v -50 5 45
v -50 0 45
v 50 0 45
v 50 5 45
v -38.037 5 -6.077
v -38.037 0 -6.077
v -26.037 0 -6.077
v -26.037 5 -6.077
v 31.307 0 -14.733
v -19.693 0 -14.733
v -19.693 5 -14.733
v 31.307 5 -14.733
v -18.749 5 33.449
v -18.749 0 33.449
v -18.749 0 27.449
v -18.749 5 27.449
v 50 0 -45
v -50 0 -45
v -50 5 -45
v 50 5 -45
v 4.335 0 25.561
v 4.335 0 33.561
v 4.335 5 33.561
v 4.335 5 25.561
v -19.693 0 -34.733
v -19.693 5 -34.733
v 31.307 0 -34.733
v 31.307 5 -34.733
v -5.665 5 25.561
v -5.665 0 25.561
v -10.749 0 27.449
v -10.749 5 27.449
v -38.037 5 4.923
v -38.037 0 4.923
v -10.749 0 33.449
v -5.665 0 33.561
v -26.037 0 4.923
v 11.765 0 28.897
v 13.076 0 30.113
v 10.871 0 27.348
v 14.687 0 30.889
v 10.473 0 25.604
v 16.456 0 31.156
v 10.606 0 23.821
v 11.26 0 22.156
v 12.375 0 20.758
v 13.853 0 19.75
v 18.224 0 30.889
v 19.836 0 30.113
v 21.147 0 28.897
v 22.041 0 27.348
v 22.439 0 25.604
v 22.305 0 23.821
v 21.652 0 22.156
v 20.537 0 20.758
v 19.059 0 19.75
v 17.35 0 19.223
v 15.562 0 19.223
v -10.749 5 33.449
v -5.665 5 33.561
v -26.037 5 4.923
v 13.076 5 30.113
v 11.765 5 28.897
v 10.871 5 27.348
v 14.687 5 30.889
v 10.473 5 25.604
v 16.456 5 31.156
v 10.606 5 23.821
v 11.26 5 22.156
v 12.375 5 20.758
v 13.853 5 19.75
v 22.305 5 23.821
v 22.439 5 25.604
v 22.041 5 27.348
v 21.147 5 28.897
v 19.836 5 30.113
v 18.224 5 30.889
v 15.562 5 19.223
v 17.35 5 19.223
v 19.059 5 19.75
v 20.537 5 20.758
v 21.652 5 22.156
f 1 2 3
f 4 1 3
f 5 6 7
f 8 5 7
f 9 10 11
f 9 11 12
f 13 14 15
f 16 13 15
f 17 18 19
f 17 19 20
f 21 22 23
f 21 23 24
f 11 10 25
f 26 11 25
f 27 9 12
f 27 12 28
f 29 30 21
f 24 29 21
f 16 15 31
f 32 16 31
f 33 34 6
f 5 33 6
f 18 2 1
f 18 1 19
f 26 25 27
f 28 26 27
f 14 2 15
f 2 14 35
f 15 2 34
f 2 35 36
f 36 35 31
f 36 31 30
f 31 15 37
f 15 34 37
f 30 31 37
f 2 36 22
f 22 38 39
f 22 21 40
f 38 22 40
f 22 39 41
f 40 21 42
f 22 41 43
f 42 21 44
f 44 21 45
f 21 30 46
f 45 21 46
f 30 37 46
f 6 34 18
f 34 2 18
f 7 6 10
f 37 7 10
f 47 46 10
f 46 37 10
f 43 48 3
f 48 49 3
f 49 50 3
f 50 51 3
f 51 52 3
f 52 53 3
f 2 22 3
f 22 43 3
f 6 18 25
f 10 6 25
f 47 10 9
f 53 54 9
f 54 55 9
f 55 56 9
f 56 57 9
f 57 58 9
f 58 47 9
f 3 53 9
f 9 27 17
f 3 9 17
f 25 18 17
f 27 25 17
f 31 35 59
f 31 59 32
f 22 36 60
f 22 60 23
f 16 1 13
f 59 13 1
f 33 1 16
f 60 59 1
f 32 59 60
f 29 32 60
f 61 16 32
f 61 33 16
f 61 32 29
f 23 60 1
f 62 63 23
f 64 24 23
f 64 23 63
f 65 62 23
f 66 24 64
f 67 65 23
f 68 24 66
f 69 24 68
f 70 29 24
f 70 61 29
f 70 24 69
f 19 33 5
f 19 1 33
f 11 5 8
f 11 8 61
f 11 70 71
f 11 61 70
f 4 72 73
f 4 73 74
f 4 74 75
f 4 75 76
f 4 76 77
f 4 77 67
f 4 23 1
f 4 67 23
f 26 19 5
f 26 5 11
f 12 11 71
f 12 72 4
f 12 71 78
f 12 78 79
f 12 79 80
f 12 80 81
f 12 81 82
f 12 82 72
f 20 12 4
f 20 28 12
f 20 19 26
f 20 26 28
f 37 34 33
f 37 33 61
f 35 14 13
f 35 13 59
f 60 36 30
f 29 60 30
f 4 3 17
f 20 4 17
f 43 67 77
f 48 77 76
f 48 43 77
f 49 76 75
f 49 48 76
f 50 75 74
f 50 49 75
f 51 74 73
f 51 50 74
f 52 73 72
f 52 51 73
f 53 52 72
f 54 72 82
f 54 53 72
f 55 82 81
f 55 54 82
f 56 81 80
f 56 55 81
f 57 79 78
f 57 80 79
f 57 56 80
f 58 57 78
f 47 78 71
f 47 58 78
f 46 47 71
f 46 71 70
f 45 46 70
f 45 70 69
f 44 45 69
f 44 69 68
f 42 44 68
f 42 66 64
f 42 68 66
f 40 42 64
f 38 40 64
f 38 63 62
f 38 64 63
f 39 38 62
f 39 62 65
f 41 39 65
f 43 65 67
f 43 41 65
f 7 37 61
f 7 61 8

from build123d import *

# Parameters (mm, degrees)
SKETCH1_W           = 100
SKETCH1_H           = 90
BOSS_EXTRUDE2_DEPTH = 5
SKETCH2_R           = 6
SKETCH2_W           = 12
SKETCH2_H           = 11
SKETCH2_W_2         = 51
SKETCH2_H_2         = 20
SKETCH2_W_3         = 10
SKETCH2_H_3         = 8
SKETCH2_W_4         = 8
SKETCH2_H_4         = 6
CUT_EXTRUDE2_DEPTH  = 68.453687816


with BuildPart() as part:
    # Sketch1 → Boss-Extrude2 (new body)
    with BuildSketch(Plane(origin=(0, 0, 0), x_dir=(1, 0, 0), z_dir=(0, 1, 0))):
        Rectangle(SKETCH1_W, SKETCH1_H)
    extrude(amount=BOSS_EXTRUDE2_DEPTH)

    # Sketch2 → Cut-Extrude2 (cut, through all)
    with BuildSketch(Plane(origin=(0, 0, 0), x_dir=(1, 0, 0), z_dir=(0, 1, 0))):
        with Locations(Location((16.455886506, -25.155924864, 0), (0, 0, 270))):
            Circle(SKETCH2_R)
        with Locations((-32.037377006, 0.57672248)):
            Rectangle(SKETCH2_W, SKETCH2_H)
        with Locations((5.806889919, 24.732711273)):
            Rectangle(SKETCH2_W_2, SKETCH2_H_2)
        with Locations((-0.665141256, -29.560577811)):
            Rectangle(SKETCH2_W_3, SKETCH2_H_3)
        with Locations((-14.748919872, -30.448958229)):
            Rectangle(SKETCH2_W_4, SKETCH2_H_4)
    extrude(amount=CUT_EXTRUDE2_DEPTH, mode=Mode.SUBTRACT)


solid = part.part
